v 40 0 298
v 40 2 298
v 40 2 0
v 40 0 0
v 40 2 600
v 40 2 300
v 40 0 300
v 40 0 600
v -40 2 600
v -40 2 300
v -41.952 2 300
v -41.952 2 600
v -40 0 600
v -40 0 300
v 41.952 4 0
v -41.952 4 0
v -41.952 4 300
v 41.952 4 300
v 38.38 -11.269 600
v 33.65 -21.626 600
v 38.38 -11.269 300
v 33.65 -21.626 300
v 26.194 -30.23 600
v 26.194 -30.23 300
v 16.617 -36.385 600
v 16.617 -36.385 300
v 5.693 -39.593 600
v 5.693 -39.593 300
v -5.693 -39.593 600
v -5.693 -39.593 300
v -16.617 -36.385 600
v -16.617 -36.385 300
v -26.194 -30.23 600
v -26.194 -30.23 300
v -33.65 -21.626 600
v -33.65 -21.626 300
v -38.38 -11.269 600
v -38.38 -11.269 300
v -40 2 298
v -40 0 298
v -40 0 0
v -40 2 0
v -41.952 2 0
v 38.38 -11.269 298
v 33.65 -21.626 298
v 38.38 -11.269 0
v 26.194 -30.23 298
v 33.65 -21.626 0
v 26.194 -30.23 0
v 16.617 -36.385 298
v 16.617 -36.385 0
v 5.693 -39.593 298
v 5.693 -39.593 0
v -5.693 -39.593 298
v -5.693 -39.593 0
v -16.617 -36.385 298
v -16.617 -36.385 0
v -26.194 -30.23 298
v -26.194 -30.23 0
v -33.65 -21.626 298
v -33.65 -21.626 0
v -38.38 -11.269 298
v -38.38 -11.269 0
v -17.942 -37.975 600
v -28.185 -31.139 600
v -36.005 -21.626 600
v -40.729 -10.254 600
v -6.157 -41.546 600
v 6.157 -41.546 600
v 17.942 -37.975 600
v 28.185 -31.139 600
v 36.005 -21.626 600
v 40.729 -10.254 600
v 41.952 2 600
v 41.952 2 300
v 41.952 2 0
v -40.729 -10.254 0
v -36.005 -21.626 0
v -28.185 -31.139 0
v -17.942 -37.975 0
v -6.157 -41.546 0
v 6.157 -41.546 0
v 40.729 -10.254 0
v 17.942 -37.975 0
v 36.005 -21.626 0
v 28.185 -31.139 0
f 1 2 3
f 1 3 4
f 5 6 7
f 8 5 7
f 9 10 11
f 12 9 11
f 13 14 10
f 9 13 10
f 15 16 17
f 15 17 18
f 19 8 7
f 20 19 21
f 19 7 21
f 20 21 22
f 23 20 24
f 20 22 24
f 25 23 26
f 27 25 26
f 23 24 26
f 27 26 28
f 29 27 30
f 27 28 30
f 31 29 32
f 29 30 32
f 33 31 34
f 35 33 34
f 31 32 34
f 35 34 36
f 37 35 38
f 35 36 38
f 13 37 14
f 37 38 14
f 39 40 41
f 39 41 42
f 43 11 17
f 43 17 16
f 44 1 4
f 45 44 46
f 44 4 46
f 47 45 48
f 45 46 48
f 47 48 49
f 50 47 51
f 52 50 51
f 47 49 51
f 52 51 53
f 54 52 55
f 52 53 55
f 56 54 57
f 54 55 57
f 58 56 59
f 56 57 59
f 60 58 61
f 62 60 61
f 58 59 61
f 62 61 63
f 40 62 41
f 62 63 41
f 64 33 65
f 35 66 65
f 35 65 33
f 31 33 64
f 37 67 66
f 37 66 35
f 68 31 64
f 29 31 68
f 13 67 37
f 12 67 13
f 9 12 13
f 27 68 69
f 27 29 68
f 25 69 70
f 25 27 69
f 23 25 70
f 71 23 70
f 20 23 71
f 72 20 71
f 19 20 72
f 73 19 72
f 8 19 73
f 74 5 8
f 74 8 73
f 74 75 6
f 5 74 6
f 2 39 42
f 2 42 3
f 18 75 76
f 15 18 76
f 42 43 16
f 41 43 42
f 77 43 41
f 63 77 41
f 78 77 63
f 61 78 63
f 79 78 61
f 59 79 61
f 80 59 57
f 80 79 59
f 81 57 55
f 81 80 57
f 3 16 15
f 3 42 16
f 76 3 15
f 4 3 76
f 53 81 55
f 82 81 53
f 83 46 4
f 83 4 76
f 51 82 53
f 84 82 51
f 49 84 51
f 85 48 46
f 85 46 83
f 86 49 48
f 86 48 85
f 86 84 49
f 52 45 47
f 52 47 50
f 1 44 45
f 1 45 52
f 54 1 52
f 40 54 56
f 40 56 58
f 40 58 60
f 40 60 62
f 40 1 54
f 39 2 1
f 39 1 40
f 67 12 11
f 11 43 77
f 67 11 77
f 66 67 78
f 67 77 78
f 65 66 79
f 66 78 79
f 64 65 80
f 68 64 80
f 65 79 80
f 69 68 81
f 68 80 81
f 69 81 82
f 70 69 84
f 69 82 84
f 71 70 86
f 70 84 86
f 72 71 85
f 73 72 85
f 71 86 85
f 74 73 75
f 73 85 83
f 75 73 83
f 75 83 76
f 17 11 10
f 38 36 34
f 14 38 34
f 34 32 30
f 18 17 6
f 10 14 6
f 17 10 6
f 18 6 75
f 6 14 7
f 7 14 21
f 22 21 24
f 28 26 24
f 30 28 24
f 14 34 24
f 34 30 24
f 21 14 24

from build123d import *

# Parameters (mm, degrees)
BOSS_EXTRUDE1_DEPTH = 600
SKETCH2_W           = 83.904707854
SKETCH2_H           = 300
BOSS_EXTRUDE2_DEPTH = 2
BOSS_EXTRUDE3_START = -298
BOSS_EXTRUDE3_DEPTH = 2


with BuildPart() as part:
    # Sketch1 → Boss-Extrude1 (new body)
    with BuildSketch(Plane.XY):
        with BuildLine():
            Line((41.952353927, 2), (40, 2))
            Line((40, 2), (40, 0))
            ThreePointArc((40, 0), (0, -40), (-40, 0))
            Line((-40, 0), (-40, 2))
            Line((-40, 2), (-41.952353927, 2))
            ThreePointArc((-41.952353927, 2), (0, -42), (41.952353927, 2))
        make_face()
    extrude(amount=BOSS_EXTRUDE1_DEPTH)

    # Sketch2 → Boss-Extrude2 (add)
    with BuildSketch(Plane(origin=(0, 2, 0), x_dir=(1, 0, 0), z_dir=(0, 1, 0))):
        with Locations((0, -150)):
            Rectangle(SKETCH2_W, SKETCH2_H)
    extrude(amount=BOSS_EXTRUDE2_DEPTH)

    # Sketch3 → Boss-Extrude3 (add)
    with BuildSketch(Plane(origin=(0, 0, 0), x_dir=(-1, 0, 0), z_dir=(0, 0, -1)).offset(BOSS_EXTRUDE3_START)):
        with BuildLine():
            Line((41.952353927, 2), (-41.952353927, 2))
            ThreePointArc((-41.952353927, 2), (0, -42), (41.952353927, 2))
        make_face()
    extrude(amount=-BOSS_EXTRUDE3_DEPTH)


solid = part.part
